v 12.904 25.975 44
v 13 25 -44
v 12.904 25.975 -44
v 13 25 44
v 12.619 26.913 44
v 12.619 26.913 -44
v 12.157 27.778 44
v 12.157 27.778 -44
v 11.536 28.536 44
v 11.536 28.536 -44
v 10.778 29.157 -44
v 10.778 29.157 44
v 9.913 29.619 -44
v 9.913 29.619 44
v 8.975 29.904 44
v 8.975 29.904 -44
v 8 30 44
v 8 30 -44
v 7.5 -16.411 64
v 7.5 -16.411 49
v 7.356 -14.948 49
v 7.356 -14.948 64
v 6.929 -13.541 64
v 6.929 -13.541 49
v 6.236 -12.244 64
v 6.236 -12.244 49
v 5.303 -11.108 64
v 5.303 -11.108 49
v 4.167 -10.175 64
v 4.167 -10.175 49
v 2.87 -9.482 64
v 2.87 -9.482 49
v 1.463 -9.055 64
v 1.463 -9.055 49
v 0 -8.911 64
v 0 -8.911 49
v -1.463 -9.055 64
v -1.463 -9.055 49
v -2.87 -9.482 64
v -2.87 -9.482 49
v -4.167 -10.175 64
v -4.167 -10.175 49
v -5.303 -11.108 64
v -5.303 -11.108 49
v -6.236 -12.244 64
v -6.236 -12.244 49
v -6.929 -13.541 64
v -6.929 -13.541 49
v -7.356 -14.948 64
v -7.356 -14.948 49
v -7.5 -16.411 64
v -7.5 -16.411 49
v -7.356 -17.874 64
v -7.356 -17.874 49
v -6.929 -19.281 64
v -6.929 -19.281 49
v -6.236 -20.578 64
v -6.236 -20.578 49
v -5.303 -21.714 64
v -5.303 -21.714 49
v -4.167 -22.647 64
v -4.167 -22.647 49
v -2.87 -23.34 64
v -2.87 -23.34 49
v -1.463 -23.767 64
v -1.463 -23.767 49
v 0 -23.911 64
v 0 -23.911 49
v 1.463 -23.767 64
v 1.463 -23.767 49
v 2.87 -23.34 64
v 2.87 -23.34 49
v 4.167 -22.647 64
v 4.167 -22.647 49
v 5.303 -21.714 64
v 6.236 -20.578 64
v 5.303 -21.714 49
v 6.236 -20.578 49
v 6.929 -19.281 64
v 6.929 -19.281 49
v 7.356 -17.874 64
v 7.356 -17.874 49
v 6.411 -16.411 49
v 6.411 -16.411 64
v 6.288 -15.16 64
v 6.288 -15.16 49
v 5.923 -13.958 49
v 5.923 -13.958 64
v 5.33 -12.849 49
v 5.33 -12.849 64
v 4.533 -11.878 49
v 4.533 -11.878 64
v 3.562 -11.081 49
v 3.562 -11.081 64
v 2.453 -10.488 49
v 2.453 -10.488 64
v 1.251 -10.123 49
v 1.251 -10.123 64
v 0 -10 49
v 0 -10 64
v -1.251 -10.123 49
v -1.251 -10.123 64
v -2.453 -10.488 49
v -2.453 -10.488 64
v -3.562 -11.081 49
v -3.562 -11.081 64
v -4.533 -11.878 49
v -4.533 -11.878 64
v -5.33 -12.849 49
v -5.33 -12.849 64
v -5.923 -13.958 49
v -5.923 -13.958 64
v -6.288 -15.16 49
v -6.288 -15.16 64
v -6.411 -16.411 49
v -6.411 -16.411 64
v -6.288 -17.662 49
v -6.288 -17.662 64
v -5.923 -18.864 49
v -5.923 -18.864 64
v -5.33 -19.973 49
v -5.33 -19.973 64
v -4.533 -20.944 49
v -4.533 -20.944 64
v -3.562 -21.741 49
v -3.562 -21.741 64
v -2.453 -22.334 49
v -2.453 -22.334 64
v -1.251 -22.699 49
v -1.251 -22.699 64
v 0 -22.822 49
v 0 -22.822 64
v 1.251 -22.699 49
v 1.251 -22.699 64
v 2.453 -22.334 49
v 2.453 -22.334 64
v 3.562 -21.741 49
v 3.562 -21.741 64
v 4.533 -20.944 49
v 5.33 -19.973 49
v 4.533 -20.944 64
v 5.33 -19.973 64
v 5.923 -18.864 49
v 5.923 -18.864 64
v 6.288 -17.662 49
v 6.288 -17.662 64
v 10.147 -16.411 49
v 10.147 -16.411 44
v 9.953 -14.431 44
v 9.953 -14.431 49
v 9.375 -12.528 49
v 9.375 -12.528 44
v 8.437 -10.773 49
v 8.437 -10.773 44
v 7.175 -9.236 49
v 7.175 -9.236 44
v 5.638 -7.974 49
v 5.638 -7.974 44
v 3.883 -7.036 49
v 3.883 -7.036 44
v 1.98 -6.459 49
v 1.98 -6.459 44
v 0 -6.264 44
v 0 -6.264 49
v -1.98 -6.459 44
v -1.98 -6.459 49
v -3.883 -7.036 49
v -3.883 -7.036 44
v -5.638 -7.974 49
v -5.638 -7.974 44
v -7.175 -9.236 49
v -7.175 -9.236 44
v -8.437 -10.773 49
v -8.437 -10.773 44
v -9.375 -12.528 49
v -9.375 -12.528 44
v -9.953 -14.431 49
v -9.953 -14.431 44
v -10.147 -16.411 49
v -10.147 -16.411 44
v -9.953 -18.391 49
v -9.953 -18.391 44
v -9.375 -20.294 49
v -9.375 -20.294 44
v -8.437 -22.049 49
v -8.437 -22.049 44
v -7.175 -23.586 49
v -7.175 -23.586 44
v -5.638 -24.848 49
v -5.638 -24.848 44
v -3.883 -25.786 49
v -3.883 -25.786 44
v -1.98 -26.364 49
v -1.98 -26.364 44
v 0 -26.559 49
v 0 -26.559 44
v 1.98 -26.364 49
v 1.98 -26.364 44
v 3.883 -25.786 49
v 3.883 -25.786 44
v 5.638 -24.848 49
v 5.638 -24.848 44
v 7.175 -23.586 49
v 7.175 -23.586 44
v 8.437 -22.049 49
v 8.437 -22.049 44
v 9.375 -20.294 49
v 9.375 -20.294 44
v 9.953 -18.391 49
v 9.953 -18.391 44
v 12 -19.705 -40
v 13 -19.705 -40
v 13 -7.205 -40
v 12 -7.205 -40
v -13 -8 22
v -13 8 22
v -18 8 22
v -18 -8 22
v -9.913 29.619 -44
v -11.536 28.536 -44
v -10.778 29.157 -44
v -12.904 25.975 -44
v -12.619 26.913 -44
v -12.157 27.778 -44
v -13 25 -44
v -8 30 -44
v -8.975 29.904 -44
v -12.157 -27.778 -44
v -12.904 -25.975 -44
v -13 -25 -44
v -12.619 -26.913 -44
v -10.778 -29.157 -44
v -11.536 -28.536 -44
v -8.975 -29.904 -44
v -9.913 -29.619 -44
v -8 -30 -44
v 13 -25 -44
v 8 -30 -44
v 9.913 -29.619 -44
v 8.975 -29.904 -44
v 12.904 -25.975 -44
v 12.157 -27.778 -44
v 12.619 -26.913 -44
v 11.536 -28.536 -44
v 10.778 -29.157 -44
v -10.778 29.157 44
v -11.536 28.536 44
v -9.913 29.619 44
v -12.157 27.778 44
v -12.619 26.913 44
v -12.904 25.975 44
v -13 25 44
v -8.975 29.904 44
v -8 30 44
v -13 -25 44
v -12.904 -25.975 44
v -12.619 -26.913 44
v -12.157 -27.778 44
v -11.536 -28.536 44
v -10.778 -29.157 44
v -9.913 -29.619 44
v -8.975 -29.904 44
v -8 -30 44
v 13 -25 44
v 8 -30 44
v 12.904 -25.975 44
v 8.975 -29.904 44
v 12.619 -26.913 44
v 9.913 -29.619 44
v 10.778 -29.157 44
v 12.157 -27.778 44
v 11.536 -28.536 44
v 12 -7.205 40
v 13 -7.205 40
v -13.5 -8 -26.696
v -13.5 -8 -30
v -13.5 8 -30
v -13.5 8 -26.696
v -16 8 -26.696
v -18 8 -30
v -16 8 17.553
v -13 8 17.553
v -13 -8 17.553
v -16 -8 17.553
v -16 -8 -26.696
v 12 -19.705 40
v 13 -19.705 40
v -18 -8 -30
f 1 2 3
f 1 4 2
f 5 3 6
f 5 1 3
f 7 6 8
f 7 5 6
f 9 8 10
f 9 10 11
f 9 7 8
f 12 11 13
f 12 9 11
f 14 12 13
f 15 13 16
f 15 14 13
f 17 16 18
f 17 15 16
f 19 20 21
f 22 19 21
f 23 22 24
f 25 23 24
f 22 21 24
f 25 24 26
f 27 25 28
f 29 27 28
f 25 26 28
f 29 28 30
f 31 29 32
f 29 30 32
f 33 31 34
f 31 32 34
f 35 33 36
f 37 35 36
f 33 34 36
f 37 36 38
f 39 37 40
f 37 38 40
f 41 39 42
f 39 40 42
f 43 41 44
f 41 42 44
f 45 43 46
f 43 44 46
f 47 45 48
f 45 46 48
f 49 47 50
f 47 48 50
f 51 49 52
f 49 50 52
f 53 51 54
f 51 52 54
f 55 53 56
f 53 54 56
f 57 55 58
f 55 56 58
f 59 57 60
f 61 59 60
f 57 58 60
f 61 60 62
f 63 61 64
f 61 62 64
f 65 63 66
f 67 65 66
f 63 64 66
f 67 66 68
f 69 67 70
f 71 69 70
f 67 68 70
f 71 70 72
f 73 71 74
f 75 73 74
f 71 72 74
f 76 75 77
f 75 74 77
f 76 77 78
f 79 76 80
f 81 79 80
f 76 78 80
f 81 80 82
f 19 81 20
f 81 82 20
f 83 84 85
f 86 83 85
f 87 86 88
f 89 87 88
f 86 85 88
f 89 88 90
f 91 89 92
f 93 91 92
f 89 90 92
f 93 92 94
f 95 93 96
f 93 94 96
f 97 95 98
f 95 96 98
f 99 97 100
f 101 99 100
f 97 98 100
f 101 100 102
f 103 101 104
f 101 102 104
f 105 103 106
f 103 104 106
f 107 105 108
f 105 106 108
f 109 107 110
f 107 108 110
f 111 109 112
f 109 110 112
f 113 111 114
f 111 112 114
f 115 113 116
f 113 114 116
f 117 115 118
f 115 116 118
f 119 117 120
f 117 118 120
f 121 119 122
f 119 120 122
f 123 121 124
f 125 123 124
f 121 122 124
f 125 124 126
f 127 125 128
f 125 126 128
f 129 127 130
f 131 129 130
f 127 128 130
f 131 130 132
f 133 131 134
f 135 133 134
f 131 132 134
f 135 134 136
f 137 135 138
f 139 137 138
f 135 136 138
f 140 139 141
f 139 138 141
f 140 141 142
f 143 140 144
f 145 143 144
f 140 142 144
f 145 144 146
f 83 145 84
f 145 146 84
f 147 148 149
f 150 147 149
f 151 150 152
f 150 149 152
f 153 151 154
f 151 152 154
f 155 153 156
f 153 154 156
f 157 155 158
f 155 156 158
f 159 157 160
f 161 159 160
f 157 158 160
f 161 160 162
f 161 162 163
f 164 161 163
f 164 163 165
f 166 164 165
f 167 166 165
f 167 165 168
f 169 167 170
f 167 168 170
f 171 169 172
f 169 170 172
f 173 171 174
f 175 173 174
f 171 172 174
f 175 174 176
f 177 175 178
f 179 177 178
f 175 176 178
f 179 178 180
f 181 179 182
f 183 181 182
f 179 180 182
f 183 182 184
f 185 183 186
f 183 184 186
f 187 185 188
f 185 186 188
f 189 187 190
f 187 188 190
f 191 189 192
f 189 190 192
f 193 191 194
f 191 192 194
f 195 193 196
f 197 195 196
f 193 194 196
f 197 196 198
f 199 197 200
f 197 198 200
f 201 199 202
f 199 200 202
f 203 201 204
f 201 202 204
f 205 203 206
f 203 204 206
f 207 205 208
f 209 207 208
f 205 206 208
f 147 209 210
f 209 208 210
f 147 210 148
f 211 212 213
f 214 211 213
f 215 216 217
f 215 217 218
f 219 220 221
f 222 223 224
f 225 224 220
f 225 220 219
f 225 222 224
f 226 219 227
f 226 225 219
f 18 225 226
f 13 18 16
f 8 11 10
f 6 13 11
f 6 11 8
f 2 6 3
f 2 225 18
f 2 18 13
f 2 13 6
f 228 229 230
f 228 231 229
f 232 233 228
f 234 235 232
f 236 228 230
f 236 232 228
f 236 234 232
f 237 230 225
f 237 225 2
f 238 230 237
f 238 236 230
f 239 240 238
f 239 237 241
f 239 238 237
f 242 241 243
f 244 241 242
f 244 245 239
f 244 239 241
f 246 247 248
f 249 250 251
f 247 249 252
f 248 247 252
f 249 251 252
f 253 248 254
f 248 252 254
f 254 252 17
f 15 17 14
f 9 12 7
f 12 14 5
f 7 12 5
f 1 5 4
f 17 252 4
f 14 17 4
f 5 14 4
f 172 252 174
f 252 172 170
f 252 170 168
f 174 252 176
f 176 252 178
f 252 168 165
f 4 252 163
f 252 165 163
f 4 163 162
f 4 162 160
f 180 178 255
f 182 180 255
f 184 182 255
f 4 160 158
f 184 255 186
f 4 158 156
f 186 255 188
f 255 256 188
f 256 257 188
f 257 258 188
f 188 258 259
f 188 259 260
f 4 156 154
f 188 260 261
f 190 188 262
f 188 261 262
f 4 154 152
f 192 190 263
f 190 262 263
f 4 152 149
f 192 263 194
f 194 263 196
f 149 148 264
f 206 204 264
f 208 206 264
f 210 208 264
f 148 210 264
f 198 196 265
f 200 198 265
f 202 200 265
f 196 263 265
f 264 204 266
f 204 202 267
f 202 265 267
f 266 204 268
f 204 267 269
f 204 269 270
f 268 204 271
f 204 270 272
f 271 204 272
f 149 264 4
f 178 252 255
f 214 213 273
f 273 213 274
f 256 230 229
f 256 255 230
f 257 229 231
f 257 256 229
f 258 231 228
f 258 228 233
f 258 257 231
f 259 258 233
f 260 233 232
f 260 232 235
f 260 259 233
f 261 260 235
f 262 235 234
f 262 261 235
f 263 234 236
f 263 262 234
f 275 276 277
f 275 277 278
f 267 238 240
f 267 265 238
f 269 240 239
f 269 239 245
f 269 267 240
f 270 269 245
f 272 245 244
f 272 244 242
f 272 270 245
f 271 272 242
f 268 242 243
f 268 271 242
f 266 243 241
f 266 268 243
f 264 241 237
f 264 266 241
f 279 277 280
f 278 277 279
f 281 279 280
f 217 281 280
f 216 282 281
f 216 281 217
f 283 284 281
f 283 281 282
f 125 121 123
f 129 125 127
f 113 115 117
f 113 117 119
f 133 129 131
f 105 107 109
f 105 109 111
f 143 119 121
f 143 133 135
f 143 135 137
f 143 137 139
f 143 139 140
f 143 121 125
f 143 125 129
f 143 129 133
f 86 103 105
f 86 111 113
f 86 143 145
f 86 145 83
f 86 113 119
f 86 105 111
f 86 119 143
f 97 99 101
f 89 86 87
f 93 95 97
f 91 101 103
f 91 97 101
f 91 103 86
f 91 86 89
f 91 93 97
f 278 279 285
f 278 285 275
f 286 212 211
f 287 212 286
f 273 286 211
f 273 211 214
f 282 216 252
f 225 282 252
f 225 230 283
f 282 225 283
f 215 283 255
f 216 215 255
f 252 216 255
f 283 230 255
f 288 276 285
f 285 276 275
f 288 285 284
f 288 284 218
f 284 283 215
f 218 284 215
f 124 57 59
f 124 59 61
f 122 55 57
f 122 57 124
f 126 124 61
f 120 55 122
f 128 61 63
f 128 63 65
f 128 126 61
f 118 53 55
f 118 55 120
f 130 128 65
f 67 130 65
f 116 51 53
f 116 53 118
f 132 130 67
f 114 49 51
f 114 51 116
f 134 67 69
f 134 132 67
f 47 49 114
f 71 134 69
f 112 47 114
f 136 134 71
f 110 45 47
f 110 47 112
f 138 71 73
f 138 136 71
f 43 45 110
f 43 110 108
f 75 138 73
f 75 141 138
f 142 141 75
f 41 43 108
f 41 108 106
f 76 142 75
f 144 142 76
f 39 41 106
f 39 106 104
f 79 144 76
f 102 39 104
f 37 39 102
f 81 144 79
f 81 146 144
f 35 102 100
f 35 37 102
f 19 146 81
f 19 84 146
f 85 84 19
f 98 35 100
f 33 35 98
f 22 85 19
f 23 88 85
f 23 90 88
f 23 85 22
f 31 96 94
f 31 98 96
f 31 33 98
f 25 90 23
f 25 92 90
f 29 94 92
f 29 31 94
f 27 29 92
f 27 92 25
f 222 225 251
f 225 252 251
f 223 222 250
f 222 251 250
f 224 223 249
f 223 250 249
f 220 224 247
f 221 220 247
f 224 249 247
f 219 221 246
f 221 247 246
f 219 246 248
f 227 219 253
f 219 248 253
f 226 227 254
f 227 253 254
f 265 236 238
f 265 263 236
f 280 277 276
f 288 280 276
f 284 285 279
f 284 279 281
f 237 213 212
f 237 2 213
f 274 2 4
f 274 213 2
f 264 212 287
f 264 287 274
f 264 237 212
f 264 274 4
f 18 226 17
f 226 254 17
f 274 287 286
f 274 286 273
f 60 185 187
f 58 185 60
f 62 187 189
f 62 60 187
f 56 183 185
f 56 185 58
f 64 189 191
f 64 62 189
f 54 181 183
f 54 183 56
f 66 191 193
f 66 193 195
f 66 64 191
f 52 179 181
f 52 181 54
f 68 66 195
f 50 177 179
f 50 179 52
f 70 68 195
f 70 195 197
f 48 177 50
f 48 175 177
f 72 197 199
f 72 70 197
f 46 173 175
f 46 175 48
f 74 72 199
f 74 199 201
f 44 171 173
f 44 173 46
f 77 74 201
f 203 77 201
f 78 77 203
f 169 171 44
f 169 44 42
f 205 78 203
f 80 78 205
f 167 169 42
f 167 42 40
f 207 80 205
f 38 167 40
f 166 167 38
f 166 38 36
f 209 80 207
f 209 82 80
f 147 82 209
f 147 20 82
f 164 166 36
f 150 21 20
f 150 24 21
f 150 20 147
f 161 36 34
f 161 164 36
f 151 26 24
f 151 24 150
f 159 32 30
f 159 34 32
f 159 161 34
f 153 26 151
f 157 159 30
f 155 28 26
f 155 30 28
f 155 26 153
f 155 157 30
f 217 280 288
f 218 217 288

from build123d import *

# Parameters (mm, degrees)
F0_W      = 26
F0_H      = 88
F1_DEPTH  = 30
F2_DEPTH  = 30
F3_R      = 5
F4_R      = 10.1474815612
F5_DEPTH  = 5
F6_R      = 7.5
F7_DEPTH  = 15
F8_R      = 6.4108279614
F9_DEPTH  = 15
F10_W     = 12.5
F10_H     = 80
F11_DEPTH = 1
F12_W     = 16
F12_H     = 52
F13_DEPTH = 5
F14_W     = 3
F14_H     = 44.2491837641
F15_DEPTH = 16
F16_W     = 0.5
F16_H     = 3.3036185751
F17_DEPTH = 16


with BuildPart() as f1:
    # F0 (on Front) → F1 (new body)
    with BuildSketch(Plane.XZ):
        Rectangle(F0_W, F0_H)
    extrude(amount=F1_DEPTH)

    # F2 (add): a face of the model
    f2_faces = [f1.faces().sort_by_distance(p)[0] for p in [
        (0, 0, 0),
    ]]
    extrude(f2_faces, amount=F2_DEPTH)

    # F3
    f3_edges = [f1.edges().sort_by_distance(p)[0] for p in [
        (13, 30, 0),
        (-13, 30, 0),
        (-13, -30, 0),
        (13, -30, 0),
    ]]
    fillet(f3_edges, radius=F3_R)

    # F4 (on face) → F5 (join)
    with BuildSketch(Plane.XY.offset(44)):
        with Locations((0, -16.4110772312)):
            Circle(F4_R)
    extrude(amount=F5_DEPTH)

    # F6 (on face) → F7 (join)
    with BuildSketch(Plane.XY.offset(49)):
        with Locations((0, -16.4110772312)):
            Circle(F6_R)
    extrude(amount=F7_DEPTH)

    # F8 (on face) → F9 (cut)
    with BuildSketch(Plane.XY.offset(64)):
        with Locations((0, -16.4110772312)):
            Circle(F8_R)
    extrude(amount=-F9_DEPTH, mode=Mode.SUBTRACT)

    # F10 (on face) → F11 (cut)
    with BuildSketch(Plane.YZ.offset(13)):
        with Locations((-13.4554863907, 0)):
            Rectangle(F10_W, F10_H)
    extrude(amount=-F11_DEPTH, mode=Mode.SUBTRACT)

    # F12 (on face) → F13 (join)
    with BuildSketch(Plane(origin=(-13, 0, 0), x_dir=(0, -1, 0), z_dir=(-1, 0, 0))):
        with Locations((0, -4)):
            Rectangle(F12_W, F12_H)
    extrude(amount=F13_DEPTH)

    # F14 (on face) → F15 (cut)
    with BuildSketch(Plane.XZ.offset(8)):
        with Locations((-14.5, -4.5717895428)):
            Rectangle(F14_W, F14_H)
    extrude(amount=-F15_DEPTH, mode=Mode.SUBTRACT)

    # F16 (on face) → F17 (cut)
    with BuildSketch(Plane.XZ.offset(8)):
        with Locations((-13.25, -28.3481907124)):
            Rectangle(F16_W, F16_H)
    extrude(amount=-F17_DEPTH, mode=Mode.SUBTRACT)


solid = f1.part
